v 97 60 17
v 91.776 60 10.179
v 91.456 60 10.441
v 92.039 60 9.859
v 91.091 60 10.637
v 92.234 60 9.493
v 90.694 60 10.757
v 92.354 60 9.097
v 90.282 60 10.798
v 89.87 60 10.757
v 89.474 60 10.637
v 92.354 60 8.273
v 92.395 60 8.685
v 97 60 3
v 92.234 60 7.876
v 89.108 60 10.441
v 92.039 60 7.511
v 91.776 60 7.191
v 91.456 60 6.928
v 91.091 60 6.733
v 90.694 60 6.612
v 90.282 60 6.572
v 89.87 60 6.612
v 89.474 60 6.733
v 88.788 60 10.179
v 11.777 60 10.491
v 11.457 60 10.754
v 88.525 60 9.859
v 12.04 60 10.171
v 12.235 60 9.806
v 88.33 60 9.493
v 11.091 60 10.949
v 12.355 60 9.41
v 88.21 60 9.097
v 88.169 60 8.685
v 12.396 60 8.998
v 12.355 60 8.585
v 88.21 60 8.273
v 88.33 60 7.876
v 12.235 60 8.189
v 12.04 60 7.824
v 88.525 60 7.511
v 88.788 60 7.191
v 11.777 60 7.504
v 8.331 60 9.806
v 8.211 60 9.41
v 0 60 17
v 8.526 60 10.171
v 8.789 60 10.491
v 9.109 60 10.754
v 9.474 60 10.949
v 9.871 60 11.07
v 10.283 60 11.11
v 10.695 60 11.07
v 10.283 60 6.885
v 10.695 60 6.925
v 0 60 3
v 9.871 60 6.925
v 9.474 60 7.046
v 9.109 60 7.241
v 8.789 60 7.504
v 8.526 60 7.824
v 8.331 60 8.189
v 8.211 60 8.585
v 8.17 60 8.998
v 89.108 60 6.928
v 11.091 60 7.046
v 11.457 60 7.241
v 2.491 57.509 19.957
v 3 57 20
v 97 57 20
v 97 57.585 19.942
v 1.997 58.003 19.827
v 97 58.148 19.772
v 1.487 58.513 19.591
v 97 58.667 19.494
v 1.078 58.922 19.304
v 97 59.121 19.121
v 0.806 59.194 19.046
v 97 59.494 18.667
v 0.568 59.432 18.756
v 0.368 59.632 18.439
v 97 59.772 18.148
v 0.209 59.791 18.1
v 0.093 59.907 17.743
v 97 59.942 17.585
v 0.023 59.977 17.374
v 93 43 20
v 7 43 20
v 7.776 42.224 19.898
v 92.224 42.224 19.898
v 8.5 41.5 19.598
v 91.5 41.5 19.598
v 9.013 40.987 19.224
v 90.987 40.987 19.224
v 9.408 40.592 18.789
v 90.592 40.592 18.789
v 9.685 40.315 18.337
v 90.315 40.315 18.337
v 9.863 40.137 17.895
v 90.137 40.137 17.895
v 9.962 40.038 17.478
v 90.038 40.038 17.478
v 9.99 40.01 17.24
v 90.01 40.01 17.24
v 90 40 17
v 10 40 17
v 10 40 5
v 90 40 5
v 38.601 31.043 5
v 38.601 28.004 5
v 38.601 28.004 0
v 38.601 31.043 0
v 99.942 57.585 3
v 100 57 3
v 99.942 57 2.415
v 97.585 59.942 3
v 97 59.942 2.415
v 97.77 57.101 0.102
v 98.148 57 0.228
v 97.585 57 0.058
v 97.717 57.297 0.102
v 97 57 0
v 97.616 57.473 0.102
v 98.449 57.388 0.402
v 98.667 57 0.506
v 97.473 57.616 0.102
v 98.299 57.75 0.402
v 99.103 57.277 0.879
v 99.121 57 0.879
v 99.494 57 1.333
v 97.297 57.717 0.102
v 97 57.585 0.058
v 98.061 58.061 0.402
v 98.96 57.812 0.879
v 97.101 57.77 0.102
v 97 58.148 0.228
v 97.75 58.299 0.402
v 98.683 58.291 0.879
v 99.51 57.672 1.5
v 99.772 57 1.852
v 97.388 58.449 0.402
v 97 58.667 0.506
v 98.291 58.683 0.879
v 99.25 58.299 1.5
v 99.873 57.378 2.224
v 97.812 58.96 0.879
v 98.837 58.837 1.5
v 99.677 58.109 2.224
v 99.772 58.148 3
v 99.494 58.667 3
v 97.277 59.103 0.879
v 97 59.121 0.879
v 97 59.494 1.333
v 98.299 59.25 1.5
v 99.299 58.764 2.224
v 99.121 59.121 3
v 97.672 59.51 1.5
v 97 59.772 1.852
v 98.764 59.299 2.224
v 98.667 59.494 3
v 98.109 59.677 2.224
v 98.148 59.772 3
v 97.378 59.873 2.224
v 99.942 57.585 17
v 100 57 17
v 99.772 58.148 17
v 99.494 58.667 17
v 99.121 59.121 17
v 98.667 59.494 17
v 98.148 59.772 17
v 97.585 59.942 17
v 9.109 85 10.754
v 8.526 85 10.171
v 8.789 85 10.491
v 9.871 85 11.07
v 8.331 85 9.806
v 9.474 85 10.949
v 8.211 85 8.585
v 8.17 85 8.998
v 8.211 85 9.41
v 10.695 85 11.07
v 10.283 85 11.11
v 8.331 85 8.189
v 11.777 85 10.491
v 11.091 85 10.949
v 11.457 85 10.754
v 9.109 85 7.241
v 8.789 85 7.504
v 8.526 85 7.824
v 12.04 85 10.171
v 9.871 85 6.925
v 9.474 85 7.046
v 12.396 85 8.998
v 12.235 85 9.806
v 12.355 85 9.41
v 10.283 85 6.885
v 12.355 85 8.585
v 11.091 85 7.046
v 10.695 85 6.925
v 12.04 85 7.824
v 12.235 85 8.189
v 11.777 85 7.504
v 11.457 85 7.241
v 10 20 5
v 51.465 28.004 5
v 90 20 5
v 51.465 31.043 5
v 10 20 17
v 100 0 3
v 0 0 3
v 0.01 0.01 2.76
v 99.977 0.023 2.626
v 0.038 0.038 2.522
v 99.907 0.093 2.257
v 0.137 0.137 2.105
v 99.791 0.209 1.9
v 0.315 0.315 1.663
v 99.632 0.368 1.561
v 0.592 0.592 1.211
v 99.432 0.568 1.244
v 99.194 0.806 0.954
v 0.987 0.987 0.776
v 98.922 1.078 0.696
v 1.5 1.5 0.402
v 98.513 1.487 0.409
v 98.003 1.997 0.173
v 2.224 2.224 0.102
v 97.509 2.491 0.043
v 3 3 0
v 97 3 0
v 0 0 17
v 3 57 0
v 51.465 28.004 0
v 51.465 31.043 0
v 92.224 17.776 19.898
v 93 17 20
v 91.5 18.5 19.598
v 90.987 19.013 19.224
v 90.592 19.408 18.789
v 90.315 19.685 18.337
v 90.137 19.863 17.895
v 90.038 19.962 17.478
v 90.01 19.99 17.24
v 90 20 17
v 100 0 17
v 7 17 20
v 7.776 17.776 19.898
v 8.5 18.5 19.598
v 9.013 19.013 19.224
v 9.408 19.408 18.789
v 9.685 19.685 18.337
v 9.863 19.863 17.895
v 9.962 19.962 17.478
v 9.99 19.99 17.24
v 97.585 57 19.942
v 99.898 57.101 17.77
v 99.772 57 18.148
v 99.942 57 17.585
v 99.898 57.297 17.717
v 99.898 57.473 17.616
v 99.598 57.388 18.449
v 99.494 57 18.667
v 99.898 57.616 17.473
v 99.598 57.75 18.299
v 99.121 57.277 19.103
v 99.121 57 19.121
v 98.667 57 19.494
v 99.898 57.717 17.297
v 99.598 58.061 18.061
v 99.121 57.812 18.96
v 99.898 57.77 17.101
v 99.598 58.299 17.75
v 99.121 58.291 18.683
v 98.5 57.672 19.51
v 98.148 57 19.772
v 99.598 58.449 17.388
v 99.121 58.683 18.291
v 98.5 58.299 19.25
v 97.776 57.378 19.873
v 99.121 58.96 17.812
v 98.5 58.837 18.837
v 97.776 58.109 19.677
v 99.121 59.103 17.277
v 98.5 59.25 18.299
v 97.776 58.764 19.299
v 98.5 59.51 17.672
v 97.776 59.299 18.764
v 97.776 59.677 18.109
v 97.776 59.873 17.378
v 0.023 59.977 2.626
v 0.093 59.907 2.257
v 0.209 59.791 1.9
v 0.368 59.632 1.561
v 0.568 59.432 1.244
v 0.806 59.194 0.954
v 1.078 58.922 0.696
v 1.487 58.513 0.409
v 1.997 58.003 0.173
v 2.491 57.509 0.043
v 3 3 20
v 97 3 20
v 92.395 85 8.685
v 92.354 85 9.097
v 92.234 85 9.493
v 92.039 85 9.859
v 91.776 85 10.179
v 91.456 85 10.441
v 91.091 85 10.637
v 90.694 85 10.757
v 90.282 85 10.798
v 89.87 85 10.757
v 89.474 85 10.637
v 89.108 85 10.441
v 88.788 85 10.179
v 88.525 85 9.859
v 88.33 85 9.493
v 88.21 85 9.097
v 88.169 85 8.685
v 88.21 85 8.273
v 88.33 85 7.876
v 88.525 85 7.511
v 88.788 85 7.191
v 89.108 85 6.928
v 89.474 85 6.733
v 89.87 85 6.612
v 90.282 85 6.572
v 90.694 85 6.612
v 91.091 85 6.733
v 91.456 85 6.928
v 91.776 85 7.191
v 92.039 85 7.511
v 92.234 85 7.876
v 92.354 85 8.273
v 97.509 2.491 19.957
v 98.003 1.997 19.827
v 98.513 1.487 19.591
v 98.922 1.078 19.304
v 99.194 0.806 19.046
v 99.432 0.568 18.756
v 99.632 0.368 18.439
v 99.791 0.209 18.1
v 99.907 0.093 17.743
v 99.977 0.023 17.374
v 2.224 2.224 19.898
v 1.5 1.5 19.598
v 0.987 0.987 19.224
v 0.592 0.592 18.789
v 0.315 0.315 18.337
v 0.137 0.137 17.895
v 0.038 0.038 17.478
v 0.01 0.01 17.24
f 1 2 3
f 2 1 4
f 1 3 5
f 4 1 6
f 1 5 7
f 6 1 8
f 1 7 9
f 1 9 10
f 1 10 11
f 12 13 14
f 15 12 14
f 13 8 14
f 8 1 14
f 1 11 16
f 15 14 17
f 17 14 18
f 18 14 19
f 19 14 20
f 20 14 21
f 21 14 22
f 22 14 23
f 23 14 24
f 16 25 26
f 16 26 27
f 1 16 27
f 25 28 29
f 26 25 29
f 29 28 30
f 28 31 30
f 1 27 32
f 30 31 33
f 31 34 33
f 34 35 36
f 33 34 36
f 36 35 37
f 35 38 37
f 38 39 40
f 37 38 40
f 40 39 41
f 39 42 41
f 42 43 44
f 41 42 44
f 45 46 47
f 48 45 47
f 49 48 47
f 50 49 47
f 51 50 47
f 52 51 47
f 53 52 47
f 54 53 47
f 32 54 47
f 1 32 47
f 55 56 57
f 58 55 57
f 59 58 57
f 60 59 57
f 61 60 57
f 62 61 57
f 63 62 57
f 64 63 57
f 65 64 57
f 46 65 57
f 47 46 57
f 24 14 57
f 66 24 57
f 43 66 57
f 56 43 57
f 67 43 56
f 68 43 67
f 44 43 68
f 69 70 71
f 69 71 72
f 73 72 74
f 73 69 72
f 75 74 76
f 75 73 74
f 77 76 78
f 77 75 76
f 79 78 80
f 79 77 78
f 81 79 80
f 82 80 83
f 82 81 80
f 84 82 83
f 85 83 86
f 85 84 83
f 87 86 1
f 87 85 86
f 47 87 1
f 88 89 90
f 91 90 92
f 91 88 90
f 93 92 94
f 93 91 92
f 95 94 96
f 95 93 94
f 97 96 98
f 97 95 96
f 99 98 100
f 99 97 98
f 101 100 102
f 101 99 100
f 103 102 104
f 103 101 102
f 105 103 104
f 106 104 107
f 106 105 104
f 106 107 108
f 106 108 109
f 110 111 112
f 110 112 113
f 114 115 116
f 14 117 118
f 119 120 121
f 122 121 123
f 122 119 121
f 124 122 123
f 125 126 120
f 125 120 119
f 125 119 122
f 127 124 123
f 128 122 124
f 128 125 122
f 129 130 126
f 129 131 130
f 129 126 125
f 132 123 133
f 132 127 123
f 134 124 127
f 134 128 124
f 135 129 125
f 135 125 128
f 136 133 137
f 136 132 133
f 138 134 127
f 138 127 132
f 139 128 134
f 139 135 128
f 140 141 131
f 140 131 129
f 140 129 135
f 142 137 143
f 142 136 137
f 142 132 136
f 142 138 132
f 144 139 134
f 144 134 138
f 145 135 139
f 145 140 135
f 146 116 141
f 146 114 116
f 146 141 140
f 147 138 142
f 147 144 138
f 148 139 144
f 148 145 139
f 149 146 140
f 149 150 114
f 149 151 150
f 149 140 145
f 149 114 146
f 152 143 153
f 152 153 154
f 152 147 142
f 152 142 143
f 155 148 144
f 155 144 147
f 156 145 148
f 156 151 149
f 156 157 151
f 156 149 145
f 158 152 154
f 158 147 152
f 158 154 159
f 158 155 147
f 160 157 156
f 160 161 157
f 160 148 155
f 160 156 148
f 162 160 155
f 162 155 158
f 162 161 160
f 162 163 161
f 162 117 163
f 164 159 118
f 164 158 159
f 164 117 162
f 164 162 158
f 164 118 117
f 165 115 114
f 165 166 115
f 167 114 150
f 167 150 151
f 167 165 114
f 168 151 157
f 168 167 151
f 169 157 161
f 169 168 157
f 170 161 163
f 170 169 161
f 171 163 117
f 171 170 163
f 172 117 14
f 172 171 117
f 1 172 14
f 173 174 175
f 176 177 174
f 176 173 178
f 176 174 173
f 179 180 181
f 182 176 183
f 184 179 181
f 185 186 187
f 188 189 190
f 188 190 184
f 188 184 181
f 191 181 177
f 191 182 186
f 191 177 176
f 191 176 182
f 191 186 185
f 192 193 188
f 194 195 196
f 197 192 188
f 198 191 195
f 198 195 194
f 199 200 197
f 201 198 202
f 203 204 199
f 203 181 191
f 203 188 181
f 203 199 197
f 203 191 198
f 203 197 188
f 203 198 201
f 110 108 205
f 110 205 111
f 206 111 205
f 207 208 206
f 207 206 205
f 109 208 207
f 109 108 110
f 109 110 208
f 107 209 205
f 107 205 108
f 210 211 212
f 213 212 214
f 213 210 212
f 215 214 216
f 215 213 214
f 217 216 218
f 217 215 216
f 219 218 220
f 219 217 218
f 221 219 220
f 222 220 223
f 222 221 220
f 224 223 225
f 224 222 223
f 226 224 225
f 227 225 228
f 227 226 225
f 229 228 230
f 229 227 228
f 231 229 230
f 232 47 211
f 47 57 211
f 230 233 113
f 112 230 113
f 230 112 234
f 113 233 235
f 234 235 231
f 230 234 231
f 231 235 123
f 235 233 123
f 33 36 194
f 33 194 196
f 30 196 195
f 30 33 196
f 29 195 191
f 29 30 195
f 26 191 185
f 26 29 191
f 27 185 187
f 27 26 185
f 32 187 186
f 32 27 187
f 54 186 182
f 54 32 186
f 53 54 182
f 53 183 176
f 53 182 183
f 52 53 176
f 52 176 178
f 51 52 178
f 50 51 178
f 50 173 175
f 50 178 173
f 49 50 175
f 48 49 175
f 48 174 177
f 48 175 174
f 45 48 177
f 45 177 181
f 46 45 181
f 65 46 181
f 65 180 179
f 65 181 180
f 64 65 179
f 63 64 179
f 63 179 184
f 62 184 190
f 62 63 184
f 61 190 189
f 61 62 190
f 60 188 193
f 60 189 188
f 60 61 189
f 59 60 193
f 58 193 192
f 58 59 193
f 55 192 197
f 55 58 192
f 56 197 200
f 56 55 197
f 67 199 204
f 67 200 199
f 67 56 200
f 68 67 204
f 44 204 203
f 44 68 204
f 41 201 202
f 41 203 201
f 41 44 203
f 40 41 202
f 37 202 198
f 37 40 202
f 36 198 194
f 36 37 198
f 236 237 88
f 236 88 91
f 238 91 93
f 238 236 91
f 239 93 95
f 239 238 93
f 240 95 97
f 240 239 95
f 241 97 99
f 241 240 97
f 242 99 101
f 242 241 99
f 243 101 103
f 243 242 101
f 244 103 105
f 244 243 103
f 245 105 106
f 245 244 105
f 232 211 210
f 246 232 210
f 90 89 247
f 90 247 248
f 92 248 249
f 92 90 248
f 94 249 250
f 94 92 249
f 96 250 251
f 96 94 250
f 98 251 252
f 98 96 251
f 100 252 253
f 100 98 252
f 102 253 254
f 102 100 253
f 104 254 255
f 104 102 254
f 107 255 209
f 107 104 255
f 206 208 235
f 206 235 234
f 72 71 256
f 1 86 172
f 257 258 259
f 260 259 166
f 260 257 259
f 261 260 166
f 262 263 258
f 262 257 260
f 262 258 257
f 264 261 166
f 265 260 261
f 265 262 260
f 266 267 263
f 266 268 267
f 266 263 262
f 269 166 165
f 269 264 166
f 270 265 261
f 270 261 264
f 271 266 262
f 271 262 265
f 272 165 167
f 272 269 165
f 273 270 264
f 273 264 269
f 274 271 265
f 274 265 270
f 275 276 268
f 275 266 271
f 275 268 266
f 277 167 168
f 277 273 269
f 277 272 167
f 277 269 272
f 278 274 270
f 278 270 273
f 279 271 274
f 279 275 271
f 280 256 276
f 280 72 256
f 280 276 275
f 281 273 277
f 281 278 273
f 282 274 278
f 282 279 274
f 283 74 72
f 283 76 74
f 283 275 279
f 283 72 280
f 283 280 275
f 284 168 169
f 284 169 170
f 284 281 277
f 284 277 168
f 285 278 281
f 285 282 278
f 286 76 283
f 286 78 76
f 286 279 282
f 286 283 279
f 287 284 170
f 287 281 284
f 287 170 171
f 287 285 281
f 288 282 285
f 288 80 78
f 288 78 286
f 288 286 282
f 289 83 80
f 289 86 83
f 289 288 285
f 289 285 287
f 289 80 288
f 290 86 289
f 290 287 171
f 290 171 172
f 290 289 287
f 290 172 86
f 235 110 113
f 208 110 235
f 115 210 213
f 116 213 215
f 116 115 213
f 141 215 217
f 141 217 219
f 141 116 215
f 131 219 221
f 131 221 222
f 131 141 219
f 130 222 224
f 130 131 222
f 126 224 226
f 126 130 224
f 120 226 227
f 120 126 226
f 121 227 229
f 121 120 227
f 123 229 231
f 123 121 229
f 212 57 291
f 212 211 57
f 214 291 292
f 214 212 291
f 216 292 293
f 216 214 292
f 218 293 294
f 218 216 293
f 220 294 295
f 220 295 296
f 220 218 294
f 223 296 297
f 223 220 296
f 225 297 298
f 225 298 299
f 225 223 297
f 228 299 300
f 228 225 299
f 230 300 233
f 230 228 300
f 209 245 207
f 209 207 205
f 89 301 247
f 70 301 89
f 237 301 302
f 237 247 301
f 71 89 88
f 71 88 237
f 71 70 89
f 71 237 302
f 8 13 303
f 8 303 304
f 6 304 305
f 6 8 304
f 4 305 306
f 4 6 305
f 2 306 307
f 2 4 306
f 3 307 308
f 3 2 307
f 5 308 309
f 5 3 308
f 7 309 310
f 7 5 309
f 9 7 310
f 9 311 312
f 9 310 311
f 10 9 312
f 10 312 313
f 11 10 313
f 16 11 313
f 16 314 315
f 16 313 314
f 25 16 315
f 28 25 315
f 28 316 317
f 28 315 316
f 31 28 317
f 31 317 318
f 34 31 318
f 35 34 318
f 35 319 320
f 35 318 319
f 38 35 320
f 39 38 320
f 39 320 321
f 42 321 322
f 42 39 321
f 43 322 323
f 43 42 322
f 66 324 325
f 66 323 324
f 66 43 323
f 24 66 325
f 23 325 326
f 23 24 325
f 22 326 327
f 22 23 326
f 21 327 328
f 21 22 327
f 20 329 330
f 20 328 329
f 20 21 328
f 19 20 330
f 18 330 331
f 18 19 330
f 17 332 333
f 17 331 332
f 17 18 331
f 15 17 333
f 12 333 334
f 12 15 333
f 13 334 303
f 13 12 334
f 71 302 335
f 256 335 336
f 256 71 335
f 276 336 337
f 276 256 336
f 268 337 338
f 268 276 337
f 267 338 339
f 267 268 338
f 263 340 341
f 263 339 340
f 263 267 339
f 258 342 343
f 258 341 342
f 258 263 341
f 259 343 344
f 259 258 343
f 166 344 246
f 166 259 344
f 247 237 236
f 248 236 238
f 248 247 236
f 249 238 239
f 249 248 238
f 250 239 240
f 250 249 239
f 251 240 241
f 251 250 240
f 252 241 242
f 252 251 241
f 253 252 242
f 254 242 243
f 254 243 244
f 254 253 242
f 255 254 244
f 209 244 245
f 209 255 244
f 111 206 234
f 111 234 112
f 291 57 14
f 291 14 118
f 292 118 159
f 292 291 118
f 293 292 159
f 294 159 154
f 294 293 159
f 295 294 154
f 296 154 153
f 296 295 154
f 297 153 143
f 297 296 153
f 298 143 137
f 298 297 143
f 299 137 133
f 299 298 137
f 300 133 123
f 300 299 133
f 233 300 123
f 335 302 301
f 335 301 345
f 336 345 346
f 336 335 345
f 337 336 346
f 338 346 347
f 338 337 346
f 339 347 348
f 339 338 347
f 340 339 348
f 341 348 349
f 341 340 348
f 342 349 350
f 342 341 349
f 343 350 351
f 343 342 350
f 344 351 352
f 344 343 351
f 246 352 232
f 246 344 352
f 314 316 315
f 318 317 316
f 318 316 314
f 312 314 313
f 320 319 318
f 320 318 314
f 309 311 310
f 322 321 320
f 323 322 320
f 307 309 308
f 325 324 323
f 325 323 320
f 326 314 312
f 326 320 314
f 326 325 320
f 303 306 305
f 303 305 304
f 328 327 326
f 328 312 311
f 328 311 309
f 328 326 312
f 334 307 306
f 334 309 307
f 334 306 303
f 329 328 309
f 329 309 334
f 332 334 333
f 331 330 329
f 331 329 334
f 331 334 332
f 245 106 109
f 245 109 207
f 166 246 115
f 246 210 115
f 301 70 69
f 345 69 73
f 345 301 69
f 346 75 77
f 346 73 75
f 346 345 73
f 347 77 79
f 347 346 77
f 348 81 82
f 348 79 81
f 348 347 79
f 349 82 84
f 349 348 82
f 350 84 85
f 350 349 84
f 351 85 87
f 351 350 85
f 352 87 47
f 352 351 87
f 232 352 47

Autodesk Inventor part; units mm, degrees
ref_plane "YZ Plane" through (0, 0, 0) normal (1, 0, 0) x (0, 1, 0)
ref_plane "XZ Plane" through (0, 0, 0) normal (0, 1, 0) x (-1, 0, 0)
ref_plane "XY Plane" through (0, 0, 0) normal (0, 0, 1) x (1, 0, 0)
sketch "Sketch1" plane through (0, 0, 0) normal (0, 0, 1) x (1, 0, 0)
  line L0 (0, 60) -> (0, 0)
  line L1 (0, 0) -> (100, 0)
  line L2 (100, 0) -> (100, 60)
  line L3 (100, 60) -> (0, 60)
extrude "Extrusion1" add sketch "Sketch1" along normal blind 20
sketch "Sketch2" plane through (0, 0, 20) normal (0, 0, 1) x (1, 0, 0)
  line L0 (10, 40) -> (90, 40)
  line L1 (90, 40) -> (90, 20)
  line L2 (90, 20) -> (10, 20)
  line L3 (10, 20) -> (10, 40)
  line L4 (100, 60) -> (0, 60) projected
  line L5 (0, 0) -> (100, 0) projected
  line L6 (100, 0) -> (100, 60) projected
  line L7 (0, 60) -> (0, 0) projected
extrude "Extrusion2" cut sketch "Sketch2" against normal blind 15 contours L0 L1 L2 L3
sketch "Sketch3" plane through (0, 0, 20) normal (0, 0, 1) x (1, 0, 0)
  line L0 (38.6013, 31.0426) -> (51.4646, 31.0426)
  line L1 (51.4646, 31.0426) -> (51.4646, 28.004)
  line L2 (51.4646, 28.004) -> (38.6013, 28.004)
  line L3 (38.6013, 28.004) -> (38.6013, 31.0426)
  point P0 (0, 0)
extrude "Extrusion3" cut sketch "Sketch3" against normal through all
sketch "Sketch4" plane through (0, 60, 0) normal (0, 1, 0) x (1, 0, 0)
  line L0 (0, 0) -> (0, -20) projected
  line L1 (100, 0) -> (100, -20) projected
  circle A0 centre (10.2828, -8.9975) radius 2.1128
  circle A1 centre (90.2822, -8.6847) radius 2.1128
  dimension "d18" = 80
extrude "Extrusion4" add sketch "Sketch4" along normal blind 25
sketch "Sketch5" plane through (0, 60, 0) normal (0, 1, 0) x (1, 0, 0)
  circle A0 centre (10.2828, -8.9975) radius 2.1128 projected
  line L0 (97.4061, -6.1607) -> (97.5, -6.1584)
  line L1 (10.2828, -5.156) -> (10.2828, -8.9975)
  point P0 (0, 0)
fillet "Fillet1" radius 3 13 edges at (50, 60, 20) (100, 30, 20) (100, 60, 10) (100, 30, 0) (50, 60, 0) (50, 0, 20) (50, 20, 20) (50, 40, 20) (10, 30, 20) (90, 30, 20) (0, 30, 20) (0, 30, 0) (50, 0, 0)
properties part number "part3nn" material "Polyethylene, High Density"
